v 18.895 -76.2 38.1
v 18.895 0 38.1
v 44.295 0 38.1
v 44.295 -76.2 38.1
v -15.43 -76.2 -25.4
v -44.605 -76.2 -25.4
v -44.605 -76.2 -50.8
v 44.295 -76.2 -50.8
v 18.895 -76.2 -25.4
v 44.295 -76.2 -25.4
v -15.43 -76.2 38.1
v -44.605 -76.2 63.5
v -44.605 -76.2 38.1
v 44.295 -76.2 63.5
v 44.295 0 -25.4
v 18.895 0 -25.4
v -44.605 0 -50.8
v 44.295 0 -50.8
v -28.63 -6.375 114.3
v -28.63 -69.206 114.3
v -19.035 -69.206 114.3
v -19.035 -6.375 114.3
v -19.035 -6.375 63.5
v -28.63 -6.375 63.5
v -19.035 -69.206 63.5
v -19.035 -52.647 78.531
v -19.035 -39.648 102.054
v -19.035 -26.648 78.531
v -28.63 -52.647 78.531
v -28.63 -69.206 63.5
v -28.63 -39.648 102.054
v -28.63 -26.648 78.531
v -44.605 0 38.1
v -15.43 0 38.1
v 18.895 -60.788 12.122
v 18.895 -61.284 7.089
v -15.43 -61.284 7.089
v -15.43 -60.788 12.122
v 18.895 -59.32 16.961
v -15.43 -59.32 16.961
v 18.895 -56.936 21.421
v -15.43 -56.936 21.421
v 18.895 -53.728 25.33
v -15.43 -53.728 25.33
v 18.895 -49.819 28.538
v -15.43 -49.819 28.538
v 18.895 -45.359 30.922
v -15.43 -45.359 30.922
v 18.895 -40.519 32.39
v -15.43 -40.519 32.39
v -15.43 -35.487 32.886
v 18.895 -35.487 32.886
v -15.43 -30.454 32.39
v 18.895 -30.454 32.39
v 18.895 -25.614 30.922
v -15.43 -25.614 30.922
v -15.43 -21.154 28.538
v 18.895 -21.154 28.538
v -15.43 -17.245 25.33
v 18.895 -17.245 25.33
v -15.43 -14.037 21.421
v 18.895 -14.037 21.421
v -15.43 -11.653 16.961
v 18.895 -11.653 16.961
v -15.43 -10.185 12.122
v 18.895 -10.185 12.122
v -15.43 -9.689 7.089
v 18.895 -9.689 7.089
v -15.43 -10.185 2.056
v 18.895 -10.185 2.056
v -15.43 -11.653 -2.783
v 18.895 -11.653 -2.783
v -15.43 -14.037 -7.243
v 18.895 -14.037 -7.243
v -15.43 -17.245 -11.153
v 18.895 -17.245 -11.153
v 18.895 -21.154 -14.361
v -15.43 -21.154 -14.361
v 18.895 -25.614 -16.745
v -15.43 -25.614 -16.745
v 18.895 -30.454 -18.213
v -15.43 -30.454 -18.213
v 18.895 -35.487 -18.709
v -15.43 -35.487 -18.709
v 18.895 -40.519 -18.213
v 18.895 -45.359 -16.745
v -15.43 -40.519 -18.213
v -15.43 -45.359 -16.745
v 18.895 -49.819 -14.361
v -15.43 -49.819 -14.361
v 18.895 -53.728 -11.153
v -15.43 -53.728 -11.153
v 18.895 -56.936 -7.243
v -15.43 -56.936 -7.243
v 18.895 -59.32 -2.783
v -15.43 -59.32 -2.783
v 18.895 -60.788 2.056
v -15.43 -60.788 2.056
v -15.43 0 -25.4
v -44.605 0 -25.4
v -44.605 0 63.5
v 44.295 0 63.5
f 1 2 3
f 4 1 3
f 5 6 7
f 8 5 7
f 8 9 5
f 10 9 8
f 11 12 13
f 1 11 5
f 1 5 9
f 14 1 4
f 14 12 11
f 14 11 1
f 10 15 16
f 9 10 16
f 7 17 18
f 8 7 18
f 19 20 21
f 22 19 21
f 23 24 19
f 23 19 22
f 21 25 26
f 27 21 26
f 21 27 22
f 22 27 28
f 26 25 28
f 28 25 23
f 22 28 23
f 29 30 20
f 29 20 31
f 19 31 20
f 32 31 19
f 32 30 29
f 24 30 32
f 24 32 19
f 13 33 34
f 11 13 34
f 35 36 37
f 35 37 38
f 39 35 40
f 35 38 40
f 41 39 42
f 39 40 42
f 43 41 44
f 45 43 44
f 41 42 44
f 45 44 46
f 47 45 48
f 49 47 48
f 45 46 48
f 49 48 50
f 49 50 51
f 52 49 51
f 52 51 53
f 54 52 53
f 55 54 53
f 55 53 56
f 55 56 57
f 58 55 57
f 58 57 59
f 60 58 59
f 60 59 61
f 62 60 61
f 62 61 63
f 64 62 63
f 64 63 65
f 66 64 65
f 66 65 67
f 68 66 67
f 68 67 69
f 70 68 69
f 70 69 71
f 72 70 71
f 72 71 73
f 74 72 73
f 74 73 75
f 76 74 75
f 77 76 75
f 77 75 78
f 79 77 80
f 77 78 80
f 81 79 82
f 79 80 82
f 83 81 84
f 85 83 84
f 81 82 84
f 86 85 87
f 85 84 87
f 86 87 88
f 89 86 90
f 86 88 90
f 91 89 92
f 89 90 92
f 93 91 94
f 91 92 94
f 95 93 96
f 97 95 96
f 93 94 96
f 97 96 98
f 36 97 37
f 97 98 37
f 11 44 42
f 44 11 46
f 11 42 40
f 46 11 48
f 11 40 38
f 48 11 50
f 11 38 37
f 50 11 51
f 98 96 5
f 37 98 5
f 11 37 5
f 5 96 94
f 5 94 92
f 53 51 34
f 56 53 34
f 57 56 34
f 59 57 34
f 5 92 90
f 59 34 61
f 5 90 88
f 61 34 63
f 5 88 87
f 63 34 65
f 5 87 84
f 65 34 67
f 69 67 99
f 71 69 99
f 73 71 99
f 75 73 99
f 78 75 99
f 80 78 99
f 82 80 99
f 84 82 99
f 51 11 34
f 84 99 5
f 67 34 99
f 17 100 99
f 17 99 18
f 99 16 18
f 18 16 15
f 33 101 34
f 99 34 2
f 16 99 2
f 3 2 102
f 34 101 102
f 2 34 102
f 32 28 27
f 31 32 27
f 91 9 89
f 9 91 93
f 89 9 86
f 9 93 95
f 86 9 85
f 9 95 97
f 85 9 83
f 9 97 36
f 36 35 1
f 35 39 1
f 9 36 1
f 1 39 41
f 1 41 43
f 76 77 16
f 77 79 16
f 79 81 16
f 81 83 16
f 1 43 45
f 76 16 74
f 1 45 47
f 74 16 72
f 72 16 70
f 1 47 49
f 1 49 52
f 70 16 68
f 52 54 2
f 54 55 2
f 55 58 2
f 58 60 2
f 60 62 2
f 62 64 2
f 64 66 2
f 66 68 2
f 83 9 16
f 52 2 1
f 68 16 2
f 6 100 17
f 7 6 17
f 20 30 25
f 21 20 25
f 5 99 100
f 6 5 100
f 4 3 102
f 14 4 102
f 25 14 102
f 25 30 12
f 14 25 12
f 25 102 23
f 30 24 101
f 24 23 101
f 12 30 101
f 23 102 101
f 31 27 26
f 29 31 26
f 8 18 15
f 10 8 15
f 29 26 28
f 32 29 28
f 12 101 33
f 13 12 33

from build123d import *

# Parameters (mm, degrees)
F1_DEPTH = 76.2
F2_W     = 9.595008567
F2_H     = 62.8318372183
F3_DEPTH = 50.8
F5_DEPTH = 25.5704986105
F6_R     = 25.7972308172
F7_DEPTH = 59.7263876276


with BuildPart() as f1:
    # F0 (on Front) → F1 (new body)
    with BuildSketch(Plane.XZ):
        Polygon((-44.6047578722, -25.4), (-44.6047578722, -50.8), (44.2952421278, -50.8), (44.2952421278, -25.4), (18.8952421278, -25.4), (18.8952421278, 38.1), (44.2952421278, 38.1), (44.2952421278, 63.5), (-44.6047578722, 63.5), (-44.6047578722, 38.1), (-15.4301454999, 38.1), (-15.4301454999, -25.4), align=None)
    extrude(amount=F1_DEPTH)

    # F2 (on face) → F3 (join)
    with BuildSketch(Plane.XY.offset(63.5)):
        with Locations((-23.8327635452, -37.7904830966)):
            Rectangle(F2_W, F2_H)
    extrude(amount=F3_DEPTH)

    # F4 (on face) → F5 (cut, through all)
    with BuildSketch(Plane.YZ.offset(-19.0352592617)):
        Polygon((-52.6472702622, 78.5312056541), (-26.647888124, 78.5312056541), (-39.6475791931, 102.0544543862), align=None)
    extrude(amount=-F5_DEPTH, mode=Mode.SUBTRACT)

    # F6 (on face) → F7 (cut, through all)
    with BuildSketch(Plane(origin=(-15.4301454999, 0, 0), x_dir=(0, -1, 0), z_dir=(-1, 0, 0))):
        with Locations((35.4866050184, 7.0887273178)):
            Circle(F6_R)
    extrude(amount=-F7_DEPTH, mode=Mode.SUBTRACT)


solid = f1.part
